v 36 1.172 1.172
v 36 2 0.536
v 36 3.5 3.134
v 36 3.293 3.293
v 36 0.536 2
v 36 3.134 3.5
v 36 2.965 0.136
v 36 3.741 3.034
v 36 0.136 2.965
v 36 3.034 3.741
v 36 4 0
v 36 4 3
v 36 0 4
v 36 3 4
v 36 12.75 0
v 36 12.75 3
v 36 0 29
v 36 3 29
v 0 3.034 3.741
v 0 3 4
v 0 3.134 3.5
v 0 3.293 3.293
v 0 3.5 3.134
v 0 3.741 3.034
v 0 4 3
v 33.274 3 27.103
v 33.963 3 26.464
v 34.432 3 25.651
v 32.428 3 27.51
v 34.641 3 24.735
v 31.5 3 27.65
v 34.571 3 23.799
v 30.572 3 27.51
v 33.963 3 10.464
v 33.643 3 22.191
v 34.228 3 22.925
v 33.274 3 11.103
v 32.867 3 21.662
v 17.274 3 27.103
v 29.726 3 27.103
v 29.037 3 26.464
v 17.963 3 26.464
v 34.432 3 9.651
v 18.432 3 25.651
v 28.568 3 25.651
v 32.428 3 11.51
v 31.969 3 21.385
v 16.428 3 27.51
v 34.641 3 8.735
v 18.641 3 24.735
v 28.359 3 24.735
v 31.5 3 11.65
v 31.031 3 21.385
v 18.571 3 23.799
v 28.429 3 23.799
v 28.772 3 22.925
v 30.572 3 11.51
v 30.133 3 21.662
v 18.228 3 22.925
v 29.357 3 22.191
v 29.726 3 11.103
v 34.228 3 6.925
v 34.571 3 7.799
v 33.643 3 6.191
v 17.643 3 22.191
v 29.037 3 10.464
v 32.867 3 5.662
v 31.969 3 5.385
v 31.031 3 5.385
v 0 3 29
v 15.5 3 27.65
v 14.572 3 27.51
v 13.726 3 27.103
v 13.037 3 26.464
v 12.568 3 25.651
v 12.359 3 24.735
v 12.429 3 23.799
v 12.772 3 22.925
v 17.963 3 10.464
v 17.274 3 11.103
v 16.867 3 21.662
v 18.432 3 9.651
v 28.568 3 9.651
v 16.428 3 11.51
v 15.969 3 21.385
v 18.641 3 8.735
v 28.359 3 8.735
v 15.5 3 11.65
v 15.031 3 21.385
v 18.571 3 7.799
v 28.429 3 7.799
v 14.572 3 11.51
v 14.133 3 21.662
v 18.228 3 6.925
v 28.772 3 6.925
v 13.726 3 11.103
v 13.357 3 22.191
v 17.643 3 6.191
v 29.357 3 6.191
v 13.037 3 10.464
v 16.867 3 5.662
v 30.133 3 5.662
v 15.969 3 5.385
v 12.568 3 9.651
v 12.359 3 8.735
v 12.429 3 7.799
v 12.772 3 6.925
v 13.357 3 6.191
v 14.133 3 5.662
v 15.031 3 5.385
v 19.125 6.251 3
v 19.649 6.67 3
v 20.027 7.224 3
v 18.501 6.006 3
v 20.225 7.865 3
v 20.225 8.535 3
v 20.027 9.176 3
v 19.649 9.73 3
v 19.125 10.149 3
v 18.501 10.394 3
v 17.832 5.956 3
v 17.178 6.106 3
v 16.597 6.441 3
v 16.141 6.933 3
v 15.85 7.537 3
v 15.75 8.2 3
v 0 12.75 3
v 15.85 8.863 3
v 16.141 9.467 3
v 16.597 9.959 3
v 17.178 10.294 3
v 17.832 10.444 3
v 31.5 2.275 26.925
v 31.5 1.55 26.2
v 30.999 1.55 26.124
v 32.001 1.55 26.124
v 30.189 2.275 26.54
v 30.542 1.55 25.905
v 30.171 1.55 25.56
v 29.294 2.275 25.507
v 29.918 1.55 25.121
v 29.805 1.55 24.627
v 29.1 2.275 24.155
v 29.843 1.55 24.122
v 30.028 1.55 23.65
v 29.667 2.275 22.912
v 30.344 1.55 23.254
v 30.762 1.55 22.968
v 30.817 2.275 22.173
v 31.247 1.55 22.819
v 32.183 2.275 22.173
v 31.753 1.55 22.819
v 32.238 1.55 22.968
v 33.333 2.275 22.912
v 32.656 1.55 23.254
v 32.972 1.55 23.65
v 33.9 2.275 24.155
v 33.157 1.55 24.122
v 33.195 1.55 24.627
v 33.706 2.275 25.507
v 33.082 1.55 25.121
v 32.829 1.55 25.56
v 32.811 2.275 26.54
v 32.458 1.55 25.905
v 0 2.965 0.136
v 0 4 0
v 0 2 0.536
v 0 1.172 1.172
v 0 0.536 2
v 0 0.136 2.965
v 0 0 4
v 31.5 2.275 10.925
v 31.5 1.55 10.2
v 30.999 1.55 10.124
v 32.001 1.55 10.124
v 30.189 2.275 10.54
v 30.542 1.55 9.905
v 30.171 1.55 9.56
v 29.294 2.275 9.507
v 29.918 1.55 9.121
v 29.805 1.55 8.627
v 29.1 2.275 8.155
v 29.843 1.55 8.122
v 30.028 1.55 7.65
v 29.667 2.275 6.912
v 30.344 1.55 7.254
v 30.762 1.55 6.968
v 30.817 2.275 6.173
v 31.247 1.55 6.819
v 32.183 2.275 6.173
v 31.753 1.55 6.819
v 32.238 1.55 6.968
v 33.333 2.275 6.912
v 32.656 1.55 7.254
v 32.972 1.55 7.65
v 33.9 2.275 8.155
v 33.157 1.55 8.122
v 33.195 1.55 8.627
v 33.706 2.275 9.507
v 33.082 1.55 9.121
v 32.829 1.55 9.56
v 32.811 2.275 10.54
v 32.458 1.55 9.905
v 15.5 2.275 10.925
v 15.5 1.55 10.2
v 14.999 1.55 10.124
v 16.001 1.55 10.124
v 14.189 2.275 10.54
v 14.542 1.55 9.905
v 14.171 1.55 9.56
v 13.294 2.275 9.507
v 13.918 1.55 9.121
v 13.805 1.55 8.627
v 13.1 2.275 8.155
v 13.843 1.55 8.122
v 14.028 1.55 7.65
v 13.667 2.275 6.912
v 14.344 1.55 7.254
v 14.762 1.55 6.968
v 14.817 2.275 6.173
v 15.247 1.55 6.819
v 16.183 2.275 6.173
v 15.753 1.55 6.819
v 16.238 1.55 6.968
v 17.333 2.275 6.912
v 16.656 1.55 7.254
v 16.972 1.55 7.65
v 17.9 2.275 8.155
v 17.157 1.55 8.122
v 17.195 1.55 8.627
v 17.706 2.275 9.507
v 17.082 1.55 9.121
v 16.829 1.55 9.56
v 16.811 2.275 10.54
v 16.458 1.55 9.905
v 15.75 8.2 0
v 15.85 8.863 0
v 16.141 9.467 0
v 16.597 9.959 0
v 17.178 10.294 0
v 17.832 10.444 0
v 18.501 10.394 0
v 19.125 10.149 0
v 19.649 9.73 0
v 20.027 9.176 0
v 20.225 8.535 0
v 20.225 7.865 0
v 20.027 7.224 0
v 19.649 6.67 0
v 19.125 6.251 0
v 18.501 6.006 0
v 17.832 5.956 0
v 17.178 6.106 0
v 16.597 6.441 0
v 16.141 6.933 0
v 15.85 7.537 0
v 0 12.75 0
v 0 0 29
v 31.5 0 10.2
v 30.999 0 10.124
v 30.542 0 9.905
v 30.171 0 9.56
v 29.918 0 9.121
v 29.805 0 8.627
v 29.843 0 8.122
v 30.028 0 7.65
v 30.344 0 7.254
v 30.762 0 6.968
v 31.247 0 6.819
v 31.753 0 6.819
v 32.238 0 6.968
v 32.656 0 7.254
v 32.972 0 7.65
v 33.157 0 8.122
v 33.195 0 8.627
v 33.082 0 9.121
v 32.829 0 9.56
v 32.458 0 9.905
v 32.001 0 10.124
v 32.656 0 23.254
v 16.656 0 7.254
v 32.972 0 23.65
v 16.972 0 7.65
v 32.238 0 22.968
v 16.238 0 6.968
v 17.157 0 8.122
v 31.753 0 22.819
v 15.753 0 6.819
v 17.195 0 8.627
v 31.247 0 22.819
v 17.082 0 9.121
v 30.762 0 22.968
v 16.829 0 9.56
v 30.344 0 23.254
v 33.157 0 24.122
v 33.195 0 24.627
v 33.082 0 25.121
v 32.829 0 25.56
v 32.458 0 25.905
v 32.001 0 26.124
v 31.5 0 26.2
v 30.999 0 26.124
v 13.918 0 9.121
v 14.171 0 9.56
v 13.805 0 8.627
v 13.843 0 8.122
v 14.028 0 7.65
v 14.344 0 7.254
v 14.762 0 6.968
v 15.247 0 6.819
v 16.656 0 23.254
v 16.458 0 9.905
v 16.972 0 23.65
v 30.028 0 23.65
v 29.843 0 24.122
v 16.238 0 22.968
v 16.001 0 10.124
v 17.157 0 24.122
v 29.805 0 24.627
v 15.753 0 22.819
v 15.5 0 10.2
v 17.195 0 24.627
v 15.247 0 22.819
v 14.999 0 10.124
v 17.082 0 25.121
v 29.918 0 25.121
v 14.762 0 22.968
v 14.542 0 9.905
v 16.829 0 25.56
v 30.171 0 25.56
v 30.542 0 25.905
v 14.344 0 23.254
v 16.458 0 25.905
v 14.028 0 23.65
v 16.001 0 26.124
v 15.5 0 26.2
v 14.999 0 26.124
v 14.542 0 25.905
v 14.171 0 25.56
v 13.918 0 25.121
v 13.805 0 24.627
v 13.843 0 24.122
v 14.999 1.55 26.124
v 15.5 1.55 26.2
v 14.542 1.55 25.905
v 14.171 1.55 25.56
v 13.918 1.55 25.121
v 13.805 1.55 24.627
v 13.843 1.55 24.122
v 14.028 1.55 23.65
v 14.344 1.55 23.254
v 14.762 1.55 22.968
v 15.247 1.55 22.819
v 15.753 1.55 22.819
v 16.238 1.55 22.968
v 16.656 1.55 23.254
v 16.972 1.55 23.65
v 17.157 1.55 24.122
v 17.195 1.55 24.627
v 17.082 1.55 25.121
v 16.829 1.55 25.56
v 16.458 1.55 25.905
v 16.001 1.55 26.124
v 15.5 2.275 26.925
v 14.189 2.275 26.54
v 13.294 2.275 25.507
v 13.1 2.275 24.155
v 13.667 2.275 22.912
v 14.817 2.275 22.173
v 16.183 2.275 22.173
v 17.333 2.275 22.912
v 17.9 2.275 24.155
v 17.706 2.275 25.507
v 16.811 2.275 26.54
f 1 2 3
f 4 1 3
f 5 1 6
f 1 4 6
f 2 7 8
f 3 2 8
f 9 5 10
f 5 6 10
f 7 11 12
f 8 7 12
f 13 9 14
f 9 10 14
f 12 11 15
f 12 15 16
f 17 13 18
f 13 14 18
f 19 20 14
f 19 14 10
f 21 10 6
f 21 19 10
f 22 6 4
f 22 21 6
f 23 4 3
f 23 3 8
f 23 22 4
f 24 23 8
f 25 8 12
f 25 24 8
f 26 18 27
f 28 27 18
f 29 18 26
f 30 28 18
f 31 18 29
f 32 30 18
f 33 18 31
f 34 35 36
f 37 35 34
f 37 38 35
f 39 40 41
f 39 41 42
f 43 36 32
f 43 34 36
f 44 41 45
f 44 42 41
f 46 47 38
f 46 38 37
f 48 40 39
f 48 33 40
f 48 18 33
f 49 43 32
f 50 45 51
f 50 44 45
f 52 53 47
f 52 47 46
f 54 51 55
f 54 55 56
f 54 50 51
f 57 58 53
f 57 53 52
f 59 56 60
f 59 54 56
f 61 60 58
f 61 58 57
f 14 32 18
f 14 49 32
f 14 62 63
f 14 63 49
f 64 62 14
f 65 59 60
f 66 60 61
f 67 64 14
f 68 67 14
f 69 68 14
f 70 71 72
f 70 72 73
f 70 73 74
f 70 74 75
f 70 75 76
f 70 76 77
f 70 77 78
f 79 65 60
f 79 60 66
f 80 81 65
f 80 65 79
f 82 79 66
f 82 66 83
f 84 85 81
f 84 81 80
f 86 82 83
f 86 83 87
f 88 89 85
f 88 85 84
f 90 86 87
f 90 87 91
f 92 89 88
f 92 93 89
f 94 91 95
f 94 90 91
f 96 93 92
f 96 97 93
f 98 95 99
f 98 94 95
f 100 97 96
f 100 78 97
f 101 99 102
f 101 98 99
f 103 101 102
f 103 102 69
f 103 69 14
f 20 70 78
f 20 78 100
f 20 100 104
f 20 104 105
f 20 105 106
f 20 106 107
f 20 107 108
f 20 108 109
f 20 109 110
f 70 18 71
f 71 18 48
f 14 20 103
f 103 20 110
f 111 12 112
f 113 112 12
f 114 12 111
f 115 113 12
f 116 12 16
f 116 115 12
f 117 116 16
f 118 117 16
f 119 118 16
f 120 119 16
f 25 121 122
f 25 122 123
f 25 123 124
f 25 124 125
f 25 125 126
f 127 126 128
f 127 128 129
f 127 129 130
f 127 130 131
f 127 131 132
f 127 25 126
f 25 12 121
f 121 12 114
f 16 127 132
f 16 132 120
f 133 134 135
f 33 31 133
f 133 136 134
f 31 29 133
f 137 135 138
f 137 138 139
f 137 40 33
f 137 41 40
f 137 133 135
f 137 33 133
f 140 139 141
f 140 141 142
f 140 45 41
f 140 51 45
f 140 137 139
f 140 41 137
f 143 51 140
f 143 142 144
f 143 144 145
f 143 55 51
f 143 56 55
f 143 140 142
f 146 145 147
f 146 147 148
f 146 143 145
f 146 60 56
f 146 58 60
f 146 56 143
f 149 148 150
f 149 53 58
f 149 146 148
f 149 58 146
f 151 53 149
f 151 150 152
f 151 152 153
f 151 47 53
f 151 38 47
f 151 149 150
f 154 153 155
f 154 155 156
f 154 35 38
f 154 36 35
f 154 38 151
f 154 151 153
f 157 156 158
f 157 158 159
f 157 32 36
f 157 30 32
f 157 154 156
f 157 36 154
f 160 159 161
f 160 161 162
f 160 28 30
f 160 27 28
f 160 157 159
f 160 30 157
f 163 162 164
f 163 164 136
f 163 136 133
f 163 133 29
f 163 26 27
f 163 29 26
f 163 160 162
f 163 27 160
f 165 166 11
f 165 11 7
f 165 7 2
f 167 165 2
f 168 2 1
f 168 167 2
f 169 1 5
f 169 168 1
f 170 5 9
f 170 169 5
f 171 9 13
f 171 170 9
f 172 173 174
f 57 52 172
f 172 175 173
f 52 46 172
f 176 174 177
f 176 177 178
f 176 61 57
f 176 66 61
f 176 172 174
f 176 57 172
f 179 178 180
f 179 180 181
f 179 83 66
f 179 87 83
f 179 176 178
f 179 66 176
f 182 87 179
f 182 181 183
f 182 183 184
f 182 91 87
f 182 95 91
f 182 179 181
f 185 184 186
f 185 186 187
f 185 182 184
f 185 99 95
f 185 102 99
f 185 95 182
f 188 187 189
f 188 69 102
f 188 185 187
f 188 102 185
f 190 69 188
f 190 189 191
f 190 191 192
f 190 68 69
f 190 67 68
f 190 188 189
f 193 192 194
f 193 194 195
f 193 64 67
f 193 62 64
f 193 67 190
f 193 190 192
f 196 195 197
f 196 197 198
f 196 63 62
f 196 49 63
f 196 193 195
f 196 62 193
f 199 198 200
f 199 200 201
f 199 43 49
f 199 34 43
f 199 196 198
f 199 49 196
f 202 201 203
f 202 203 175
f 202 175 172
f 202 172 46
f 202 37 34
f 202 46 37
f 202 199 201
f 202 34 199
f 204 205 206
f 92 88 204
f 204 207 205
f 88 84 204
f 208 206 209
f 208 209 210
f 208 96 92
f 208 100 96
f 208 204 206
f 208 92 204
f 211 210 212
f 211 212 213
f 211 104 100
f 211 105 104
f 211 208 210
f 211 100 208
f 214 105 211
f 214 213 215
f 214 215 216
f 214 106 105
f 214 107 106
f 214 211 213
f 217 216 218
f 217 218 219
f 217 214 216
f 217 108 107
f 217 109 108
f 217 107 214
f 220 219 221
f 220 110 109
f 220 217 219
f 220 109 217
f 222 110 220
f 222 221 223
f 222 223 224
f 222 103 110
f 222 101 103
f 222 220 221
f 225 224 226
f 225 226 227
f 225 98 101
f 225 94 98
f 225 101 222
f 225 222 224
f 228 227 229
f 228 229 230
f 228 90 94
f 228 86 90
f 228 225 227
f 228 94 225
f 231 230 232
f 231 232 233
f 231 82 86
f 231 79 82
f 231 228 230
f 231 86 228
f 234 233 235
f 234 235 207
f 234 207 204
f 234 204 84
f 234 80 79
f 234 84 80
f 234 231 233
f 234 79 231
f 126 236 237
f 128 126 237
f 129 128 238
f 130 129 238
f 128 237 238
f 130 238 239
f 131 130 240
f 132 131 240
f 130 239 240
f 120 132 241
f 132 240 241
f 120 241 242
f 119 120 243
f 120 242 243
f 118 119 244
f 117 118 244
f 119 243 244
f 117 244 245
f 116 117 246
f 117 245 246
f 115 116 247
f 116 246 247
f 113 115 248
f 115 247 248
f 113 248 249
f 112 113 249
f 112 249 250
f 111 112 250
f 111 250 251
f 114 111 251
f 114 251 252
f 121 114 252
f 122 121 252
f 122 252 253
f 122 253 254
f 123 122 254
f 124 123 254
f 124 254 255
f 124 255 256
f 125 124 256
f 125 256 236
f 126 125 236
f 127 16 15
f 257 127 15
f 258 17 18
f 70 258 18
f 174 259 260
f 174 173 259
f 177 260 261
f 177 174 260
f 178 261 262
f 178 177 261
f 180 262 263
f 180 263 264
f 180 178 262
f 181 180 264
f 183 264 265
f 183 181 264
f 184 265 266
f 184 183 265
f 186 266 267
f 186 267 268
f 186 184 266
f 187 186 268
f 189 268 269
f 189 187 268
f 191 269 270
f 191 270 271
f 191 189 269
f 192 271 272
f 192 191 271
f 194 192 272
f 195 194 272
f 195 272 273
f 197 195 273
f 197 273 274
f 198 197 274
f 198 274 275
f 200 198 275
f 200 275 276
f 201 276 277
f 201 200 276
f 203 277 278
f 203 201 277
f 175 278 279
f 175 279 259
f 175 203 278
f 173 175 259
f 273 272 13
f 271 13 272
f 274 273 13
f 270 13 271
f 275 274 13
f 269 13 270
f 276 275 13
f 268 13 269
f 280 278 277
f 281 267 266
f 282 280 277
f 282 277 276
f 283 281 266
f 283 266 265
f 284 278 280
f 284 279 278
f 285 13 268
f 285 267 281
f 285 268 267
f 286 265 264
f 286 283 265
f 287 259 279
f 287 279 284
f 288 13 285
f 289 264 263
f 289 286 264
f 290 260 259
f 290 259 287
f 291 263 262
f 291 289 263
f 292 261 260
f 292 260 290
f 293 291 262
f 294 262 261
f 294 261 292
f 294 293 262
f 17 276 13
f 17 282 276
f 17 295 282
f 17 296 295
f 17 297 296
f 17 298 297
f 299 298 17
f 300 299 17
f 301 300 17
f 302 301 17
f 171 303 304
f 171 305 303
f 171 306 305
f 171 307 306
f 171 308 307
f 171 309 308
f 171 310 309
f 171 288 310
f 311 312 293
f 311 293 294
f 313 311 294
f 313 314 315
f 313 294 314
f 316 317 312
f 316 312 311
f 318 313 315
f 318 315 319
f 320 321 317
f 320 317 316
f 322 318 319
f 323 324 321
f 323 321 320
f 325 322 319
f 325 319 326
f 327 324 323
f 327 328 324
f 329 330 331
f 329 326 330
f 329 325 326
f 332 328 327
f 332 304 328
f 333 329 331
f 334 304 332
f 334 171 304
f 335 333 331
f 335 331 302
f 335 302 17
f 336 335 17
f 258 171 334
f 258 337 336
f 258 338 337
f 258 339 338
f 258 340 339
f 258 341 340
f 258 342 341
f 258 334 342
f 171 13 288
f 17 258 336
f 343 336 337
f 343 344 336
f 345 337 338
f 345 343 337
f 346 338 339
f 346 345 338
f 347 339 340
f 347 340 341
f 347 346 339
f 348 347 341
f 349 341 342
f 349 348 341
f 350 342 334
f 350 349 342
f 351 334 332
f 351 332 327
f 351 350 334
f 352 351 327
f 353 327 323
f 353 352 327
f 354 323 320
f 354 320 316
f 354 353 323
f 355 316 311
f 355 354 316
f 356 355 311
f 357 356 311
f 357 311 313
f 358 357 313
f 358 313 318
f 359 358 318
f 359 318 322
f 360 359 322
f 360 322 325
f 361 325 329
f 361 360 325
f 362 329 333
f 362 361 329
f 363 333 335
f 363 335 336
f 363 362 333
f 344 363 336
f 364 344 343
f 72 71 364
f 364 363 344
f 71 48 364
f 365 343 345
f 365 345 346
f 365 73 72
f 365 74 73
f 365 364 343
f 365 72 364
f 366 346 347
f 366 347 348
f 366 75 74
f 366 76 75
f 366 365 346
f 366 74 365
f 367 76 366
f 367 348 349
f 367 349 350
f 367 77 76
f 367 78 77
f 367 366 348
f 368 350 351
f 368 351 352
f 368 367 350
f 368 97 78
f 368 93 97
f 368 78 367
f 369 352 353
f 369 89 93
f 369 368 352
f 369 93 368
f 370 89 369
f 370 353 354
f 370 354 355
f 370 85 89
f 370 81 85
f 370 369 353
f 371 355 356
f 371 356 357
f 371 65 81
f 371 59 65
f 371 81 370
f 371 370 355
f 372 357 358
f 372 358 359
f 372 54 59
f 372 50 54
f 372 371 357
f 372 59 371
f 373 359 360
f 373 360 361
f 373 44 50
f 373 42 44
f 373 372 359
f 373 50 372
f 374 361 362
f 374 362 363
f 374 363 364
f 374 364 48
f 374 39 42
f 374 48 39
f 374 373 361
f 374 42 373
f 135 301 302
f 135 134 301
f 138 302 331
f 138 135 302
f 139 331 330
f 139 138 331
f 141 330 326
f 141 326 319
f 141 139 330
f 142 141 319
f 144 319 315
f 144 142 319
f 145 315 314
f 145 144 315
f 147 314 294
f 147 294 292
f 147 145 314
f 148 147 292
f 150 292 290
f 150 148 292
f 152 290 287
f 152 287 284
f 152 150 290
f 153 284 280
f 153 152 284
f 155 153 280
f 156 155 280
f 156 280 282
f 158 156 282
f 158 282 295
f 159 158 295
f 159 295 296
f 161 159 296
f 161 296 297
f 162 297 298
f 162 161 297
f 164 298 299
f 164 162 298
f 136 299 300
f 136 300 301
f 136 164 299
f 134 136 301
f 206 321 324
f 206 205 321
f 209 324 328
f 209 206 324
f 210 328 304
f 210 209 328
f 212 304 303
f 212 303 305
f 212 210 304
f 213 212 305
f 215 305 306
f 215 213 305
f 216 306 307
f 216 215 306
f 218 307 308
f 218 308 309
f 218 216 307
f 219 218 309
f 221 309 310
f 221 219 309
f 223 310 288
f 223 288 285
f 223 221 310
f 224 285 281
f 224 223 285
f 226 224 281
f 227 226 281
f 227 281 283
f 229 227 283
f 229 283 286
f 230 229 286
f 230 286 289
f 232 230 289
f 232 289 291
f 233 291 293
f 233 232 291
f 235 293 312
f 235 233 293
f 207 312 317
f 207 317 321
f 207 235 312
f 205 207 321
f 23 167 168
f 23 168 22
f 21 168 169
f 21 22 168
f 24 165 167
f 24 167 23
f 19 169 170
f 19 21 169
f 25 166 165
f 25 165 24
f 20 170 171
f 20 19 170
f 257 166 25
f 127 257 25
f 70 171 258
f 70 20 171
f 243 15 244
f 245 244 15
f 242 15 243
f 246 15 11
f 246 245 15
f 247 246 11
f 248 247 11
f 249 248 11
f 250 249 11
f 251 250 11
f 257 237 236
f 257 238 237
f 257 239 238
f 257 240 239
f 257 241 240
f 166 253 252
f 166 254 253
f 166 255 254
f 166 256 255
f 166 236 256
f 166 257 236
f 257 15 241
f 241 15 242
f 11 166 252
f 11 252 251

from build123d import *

# Parameters (mm, degrees)
T_LE_DE_BASE_PLI_E1_DEPTH                   = 36
FRAISAGE_POUR_VIS_T_TE_FRAIS_E_M31_AT_COUNT = 2
FRAISAGE_POUR_VIS_T_TE_FRAIS_E_M31_AT_PITCH = 16
FRAISAGE_POUR_VIS_T_TE_FRAIS_E_M31_2_COUNT  = 2
FRAISAGE_POUR_VIS_T_TE_FRAIS_E_M31_2_PITCH  = 22.627416998
FRAISAGE_POUR_VIS_T_TE_FRAIS_E_M31_3_COUNT  = 2
FRAISAGE_POUR_VIS_T_TE_FRAIS_E_M31_3_PITCH  = 16
D_GAGEMENT_M41_D                            = 4.5


# Sheet-metal steps are written as plain solids
with BuildPart() as part:
    # Esquisse1 → Tôle de base pliée1 (new body)
    with BuildSketch(Plane(origin=(0, 0, 0), x_dir=(0, 0, -1), z_dir=(1, 0, 0))):
        with BuildLine():
            Line((0, 12.75), (0, 4))
            ThreePointArc((0, 4), (-1.171572875, 1.171572875), (-4, 0))
            Line((-4, 0), (-29, 0))
            Line((-29, 0), (-29, 3))
            Line((-29, 3), (-4, 3))
            ThreePointArc((-4, 3), (-3.292893219, 3.292893219), (-3, 4))
            Line((-3, 4), (-3, 12.75))
            Line((-3, 12.75), (0, 12.75))
        make_face()
    extrude(amount=T_LE_DE_BASE_PLI_E1_DEPTH)

    # Esquisse7 → Fraisage pour vis à tête fraisée M31 (revolve, cut)
    with BuildSketch(Plane(origin=(15.5, 3, 24.5), x_dir=(0, 0, 1), z_dir=(1, 0, 0))):
        Polygon((0, 0), (0, 3), (1.7, 3), (1.7, 1.45), (3.15, 0), align=None)
    fraisage_pour_vis_t_te_frais_e_m31 = revolve(axis=Axis((15.5, 9.35, 24.5), (0, -1, 0)), mode=Mode.SUBTRACT)

    # Fraisage pour vis à tête fraisée M31 at: Fraisage pour vis à tête fraisée M31 ×2
    with Locations(*[(0, 0, -i * FRAISAGE_POUR_VIS_T_TE_FRAIS_E_M31_AT_PITCH) for i in range(1, FRAISAGE_POUR_VIS_T_TE_FRAIS_E_M31_AT_COUNT)]):
        add(fraisage_pour_vis_t_te_frais_e_m31, mode=Mode.SUBTRACT)

    # Fraisage pour vis _ t_te frais_e M31 2: Fraisage pour vis à tête fraisée M31 ×2
    with Locations(*[Vector(0.7071067811865476, 0, -0.7071067811865476) * (i * FRAISAGE_POUR_VIS_T_TE_FRAIS_E_M31_2_PITCH) for i in range(1, FRAISAGE_POUR_VIS_T_TE_FRAIS_E_M31_2_COUNT)]):
        add(fraisage_pour_vis_t_te_frais_e_m31, mode=Mode.SUBTRACT)

    # Fraisage pour vis _ t_te frais_e M31 3: Fraisage pour vis à tête fraisée M31 ×2
    with Locations(*[(i * FRAISAGE_POUR_VIS_T_TE_FRAIS_E_M31_3_PITCH, 0, 0) for i in range(1, FRAISAGE_POUR_VIS_T_TE_FRAIS_E_M31_3_COUNT)]):
        add(fraisage_pour_vis_t_te_frais_e_m31, mode=Mode.SUBTRACT)

    # Dégagement M41 (through all)
    with Locations(Plane.XY.offset(3)):
        with Locations((18, 8.2)):
            Hole(D_GAGEMENT_M41_D / 2)


solid = part.part
